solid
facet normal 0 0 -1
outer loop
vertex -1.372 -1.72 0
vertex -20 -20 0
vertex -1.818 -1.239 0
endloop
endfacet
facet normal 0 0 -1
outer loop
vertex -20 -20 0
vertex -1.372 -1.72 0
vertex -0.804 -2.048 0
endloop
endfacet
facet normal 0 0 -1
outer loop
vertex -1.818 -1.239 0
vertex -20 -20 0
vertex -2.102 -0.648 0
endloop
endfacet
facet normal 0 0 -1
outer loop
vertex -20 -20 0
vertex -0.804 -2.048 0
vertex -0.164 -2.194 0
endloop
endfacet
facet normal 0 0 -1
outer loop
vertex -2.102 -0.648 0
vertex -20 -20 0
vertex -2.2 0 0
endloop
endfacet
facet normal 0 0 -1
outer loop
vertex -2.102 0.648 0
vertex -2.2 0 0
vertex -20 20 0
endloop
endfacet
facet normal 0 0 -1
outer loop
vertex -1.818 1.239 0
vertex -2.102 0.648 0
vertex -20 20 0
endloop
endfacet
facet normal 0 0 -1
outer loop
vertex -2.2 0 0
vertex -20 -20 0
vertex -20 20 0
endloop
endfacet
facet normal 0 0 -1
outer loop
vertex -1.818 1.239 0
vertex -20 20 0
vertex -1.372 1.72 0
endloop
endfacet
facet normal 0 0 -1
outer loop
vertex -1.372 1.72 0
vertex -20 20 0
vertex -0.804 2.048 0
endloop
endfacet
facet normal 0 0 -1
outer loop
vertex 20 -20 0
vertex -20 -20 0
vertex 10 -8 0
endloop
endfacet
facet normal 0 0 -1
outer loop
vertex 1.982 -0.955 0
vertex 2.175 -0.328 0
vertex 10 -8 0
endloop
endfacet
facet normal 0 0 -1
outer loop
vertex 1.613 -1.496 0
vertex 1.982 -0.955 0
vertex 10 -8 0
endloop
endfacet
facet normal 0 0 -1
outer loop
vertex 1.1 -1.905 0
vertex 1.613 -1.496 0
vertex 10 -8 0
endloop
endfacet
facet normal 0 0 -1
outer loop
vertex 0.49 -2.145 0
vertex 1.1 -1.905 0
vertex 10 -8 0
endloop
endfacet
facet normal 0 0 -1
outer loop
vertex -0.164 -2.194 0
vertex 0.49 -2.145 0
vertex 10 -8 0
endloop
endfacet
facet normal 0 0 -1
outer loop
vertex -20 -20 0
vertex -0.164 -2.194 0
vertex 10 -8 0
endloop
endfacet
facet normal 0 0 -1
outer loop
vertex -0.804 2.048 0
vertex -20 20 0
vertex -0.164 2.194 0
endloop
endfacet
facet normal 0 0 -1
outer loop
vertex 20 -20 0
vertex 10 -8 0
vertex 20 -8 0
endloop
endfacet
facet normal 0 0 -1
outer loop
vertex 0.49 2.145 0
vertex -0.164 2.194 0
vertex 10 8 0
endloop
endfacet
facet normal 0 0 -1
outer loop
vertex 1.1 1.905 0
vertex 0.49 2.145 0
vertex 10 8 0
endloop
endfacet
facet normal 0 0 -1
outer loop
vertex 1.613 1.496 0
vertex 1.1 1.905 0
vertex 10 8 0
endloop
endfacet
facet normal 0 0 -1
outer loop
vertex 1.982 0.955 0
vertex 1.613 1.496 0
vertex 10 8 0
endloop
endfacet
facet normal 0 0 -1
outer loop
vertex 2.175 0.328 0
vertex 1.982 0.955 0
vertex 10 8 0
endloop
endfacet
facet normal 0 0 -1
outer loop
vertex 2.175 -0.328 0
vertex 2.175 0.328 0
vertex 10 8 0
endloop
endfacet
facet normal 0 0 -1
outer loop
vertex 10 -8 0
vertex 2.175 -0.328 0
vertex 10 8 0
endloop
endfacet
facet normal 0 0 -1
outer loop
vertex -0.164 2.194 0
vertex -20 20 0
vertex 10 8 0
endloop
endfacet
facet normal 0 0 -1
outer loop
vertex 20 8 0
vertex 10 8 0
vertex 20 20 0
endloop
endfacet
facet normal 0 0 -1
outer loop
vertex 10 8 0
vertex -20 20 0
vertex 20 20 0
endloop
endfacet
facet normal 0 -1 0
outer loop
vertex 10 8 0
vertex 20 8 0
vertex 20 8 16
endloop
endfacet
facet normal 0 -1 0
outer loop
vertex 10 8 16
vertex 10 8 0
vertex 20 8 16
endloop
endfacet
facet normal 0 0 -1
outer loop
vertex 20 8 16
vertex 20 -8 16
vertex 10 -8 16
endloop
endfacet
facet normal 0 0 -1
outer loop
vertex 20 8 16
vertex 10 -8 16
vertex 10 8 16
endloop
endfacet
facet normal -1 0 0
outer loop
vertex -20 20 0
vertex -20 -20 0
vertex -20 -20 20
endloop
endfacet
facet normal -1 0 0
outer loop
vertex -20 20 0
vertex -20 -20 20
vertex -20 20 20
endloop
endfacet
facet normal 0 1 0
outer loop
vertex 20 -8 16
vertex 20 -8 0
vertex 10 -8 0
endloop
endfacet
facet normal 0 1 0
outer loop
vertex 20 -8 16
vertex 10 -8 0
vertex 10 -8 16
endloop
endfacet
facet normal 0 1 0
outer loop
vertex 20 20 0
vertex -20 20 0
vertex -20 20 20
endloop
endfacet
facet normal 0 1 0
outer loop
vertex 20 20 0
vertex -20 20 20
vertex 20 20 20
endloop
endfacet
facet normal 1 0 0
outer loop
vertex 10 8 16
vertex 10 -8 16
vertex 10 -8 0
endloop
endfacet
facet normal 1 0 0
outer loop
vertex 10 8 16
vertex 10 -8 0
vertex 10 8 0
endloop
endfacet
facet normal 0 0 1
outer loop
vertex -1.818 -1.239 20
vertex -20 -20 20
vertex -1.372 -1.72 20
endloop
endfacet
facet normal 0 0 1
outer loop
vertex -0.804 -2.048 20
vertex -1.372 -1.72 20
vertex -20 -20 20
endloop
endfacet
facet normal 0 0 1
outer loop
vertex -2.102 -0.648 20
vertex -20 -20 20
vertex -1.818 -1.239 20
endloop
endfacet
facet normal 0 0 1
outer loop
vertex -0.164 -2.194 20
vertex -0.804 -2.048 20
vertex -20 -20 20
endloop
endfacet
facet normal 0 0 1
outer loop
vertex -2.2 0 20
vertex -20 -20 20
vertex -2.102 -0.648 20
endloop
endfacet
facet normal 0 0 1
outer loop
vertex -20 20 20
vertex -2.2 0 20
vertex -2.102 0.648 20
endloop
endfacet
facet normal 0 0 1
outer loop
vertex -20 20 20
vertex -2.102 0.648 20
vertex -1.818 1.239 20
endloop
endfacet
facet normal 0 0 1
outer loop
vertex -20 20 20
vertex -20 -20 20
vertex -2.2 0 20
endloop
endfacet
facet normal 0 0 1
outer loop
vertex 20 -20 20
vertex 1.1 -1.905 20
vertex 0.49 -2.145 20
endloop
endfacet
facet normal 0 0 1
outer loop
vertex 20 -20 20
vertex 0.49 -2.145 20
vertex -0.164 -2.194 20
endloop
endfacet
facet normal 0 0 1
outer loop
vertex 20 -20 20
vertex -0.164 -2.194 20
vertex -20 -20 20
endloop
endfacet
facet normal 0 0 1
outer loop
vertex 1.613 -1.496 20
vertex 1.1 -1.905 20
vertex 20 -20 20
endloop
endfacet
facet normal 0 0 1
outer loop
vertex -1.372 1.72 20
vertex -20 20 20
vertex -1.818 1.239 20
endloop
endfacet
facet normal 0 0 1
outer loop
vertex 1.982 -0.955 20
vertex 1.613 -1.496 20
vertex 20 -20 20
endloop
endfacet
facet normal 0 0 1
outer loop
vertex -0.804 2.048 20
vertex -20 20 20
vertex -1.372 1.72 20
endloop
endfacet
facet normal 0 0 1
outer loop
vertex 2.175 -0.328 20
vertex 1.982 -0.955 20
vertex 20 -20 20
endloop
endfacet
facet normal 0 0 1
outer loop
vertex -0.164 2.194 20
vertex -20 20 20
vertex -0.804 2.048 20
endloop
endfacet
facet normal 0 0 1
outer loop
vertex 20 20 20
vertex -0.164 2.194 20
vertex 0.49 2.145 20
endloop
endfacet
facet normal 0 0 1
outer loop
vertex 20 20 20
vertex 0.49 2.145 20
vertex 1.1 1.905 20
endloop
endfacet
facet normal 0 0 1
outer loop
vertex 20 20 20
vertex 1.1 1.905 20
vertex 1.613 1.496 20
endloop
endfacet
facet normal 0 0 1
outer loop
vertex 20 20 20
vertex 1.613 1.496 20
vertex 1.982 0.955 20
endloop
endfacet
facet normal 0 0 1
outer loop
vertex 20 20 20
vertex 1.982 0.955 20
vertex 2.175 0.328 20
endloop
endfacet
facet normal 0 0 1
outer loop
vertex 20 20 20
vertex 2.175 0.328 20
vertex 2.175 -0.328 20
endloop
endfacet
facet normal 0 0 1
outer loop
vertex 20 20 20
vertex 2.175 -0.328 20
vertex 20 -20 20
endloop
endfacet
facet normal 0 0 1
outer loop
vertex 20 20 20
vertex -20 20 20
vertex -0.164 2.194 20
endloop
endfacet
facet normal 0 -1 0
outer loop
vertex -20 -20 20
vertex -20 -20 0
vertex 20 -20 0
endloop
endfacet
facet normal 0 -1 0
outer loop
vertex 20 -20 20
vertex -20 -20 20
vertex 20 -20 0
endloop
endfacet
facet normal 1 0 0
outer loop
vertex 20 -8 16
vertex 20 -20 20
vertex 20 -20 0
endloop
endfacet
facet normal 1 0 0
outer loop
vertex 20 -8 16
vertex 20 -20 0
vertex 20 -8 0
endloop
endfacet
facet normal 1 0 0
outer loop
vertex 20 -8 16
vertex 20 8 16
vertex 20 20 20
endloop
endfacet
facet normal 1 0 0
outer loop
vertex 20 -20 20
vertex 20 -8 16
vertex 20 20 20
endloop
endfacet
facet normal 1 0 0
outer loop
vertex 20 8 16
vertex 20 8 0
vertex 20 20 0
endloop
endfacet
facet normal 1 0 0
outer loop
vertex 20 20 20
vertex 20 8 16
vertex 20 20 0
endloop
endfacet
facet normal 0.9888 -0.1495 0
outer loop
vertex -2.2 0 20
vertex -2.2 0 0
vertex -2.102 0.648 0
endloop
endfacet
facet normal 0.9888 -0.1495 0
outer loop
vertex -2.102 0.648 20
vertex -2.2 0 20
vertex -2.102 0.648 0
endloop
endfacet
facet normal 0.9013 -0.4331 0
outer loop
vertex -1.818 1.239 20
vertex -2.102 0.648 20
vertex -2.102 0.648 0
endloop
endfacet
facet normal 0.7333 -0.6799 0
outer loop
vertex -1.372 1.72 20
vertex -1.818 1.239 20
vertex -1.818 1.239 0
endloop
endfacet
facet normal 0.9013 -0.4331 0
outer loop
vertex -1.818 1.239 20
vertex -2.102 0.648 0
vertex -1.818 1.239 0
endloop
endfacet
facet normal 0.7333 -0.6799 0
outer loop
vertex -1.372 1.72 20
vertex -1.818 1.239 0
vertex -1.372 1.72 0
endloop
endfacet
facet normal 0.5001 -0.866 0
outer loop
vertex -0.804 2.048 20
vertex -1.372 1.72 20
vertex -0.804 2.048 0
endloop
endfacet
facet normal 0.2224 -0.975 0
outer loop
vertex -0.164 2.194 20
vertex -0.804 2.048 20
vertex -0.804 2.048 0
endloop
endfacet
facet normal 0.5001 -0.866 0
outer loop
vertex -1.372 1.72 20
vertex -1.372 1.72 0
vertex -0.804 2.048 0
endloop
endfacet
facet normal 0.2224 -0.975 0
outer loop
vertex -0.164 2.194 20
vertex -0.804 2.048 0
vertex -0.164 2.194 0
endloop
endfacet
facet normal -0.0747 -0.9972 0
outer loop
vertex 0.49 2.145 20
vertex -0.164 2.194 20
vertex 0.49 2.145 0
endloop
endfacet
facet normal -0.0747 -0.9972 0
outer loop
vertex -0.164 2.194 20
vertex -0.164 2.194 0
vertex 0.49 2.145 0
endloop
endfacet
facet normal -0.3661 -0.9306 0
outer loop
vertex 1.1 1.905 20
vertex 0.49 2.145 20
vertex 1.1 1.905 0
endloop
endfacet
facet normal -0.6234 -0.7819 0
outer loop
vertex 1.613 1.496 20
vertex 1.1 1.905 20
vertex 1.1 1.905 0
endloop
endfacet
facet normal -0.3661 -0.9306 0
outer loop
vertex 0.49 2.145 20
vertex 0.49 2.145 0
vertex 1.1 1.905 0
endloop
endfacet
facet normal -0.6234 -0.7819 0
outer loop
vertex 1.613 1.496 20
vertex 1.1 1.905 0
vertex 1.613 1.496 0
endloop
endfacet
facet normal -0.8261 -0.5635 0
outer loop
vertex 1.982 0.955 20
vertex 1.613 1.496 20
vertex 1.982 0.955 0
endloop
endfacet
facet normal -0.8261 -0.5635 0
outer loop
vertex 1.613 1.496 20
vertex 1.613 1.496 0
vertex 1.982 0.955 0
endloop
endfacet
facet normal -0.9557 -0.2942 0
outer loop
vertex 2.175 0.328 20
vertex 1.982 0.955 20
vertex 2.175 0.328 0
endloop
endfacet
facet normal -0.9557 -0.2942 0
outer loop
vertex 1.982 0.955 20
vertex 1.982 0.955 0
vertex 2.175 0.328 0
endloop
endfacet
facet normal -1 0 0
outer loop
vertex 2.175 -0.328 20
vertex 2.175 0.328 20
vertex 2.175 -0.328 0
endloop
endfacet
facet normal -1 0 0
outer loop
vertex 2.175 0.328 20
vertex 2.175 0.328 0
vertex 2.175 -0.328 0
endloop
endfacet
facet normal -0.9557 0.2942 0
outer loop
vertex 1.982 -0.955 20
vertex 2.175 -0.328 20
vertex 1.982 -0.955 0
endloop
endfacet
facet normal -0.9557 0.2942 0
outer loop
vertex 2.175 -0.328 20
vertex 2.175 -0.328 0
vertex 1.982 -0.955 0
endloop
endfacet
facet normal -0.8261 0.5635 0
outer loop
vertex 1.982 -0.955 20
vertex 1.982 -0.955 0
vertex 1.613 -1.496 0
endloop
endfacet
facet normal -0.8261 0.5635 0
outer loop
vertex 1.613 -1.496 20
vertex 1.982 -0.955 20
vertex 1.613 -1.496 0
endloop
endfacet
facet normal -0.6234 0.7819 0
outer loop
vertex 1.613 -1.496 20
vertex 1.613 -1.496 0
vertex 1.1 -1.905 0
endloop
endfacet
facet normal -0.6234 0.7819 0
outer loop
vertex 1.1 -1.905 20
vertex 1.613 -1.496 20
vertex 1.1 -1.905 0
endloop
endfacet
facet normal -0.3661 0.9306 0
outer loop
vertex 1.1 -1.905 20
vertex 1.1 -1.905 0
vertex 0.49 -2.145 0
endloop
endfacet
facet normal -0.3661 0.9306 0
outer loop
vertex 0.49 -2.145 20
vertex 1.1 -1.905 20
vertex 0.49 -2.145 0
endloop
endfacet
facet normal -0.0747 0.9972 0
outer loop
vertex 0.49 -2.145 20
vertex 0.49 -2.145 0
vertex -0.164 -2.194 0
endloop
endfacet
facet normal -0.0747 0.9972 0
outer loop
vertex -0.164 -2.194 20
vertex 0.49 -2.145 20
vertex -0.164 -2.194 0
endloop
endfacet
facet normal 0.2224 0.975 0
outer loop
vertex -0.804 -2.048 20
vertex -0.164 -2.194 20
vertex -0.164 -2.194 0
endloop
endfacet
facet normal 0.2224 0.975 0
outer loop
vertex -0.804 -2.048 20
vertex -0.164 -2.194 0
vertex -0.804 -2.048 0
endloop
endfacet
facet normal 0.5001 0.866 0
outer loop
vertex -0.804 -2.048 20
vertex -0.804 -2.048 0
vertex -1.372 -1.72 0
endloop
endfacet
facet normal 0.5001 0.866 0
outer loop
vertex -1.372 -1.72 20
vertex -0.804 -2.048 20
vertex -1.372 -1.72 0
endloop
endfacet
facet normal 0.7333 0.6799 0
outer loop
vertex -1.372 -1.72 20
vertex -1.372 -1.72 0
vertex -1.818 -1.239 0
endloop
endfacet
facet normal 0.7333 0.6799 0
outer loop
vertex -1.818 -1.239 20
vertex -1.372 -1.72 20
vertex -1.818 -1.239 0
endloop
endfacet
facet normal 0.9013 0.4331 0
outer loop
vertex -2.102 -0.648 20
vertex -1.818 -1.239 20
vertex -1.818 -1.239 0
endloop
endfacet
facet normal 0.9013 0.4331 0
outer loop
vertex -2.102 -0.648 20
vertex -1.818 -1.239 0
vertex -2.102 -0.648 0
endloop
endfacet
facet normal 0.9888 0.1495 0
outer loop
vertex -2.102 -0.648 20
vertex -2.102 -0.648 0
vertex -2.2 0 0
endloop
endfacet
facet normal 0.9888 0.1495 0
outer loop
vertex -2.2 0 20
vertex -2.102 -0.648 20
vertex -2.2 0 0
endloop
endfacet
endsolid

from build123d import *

# Parameters (mm, degrees)
F0_W     = 40
F0_H     = 40
F1_DEPTH = 20
F2_W     = 16
F2_H     = 16
F3_DEPTH = 10
F5_D     = 4.4


with BuildPart() as f1:
    # F0 (on Top) → F1 (new body)
    with BuildSketch(Plane.XY):
        Rectangle(F0_W, F0_H)
    extrude(amount=F1_DEPTH)

    # F2 (on face) → F3 (cut)
    with BuildSketch(Plane.YZ.offset(20)):
        with Locations((0, 8)):
            Rectangle(F2_W, F2_H)
    extrude(amount=-F3_DEPTH, mode=Mode.SUBTRACT)

    # F5 (through all)
    with Locations(Plane.XY.offset(20)):
        with Locations((0, 0)):
            Hole(F5_D / 2)


solid = f1.part
